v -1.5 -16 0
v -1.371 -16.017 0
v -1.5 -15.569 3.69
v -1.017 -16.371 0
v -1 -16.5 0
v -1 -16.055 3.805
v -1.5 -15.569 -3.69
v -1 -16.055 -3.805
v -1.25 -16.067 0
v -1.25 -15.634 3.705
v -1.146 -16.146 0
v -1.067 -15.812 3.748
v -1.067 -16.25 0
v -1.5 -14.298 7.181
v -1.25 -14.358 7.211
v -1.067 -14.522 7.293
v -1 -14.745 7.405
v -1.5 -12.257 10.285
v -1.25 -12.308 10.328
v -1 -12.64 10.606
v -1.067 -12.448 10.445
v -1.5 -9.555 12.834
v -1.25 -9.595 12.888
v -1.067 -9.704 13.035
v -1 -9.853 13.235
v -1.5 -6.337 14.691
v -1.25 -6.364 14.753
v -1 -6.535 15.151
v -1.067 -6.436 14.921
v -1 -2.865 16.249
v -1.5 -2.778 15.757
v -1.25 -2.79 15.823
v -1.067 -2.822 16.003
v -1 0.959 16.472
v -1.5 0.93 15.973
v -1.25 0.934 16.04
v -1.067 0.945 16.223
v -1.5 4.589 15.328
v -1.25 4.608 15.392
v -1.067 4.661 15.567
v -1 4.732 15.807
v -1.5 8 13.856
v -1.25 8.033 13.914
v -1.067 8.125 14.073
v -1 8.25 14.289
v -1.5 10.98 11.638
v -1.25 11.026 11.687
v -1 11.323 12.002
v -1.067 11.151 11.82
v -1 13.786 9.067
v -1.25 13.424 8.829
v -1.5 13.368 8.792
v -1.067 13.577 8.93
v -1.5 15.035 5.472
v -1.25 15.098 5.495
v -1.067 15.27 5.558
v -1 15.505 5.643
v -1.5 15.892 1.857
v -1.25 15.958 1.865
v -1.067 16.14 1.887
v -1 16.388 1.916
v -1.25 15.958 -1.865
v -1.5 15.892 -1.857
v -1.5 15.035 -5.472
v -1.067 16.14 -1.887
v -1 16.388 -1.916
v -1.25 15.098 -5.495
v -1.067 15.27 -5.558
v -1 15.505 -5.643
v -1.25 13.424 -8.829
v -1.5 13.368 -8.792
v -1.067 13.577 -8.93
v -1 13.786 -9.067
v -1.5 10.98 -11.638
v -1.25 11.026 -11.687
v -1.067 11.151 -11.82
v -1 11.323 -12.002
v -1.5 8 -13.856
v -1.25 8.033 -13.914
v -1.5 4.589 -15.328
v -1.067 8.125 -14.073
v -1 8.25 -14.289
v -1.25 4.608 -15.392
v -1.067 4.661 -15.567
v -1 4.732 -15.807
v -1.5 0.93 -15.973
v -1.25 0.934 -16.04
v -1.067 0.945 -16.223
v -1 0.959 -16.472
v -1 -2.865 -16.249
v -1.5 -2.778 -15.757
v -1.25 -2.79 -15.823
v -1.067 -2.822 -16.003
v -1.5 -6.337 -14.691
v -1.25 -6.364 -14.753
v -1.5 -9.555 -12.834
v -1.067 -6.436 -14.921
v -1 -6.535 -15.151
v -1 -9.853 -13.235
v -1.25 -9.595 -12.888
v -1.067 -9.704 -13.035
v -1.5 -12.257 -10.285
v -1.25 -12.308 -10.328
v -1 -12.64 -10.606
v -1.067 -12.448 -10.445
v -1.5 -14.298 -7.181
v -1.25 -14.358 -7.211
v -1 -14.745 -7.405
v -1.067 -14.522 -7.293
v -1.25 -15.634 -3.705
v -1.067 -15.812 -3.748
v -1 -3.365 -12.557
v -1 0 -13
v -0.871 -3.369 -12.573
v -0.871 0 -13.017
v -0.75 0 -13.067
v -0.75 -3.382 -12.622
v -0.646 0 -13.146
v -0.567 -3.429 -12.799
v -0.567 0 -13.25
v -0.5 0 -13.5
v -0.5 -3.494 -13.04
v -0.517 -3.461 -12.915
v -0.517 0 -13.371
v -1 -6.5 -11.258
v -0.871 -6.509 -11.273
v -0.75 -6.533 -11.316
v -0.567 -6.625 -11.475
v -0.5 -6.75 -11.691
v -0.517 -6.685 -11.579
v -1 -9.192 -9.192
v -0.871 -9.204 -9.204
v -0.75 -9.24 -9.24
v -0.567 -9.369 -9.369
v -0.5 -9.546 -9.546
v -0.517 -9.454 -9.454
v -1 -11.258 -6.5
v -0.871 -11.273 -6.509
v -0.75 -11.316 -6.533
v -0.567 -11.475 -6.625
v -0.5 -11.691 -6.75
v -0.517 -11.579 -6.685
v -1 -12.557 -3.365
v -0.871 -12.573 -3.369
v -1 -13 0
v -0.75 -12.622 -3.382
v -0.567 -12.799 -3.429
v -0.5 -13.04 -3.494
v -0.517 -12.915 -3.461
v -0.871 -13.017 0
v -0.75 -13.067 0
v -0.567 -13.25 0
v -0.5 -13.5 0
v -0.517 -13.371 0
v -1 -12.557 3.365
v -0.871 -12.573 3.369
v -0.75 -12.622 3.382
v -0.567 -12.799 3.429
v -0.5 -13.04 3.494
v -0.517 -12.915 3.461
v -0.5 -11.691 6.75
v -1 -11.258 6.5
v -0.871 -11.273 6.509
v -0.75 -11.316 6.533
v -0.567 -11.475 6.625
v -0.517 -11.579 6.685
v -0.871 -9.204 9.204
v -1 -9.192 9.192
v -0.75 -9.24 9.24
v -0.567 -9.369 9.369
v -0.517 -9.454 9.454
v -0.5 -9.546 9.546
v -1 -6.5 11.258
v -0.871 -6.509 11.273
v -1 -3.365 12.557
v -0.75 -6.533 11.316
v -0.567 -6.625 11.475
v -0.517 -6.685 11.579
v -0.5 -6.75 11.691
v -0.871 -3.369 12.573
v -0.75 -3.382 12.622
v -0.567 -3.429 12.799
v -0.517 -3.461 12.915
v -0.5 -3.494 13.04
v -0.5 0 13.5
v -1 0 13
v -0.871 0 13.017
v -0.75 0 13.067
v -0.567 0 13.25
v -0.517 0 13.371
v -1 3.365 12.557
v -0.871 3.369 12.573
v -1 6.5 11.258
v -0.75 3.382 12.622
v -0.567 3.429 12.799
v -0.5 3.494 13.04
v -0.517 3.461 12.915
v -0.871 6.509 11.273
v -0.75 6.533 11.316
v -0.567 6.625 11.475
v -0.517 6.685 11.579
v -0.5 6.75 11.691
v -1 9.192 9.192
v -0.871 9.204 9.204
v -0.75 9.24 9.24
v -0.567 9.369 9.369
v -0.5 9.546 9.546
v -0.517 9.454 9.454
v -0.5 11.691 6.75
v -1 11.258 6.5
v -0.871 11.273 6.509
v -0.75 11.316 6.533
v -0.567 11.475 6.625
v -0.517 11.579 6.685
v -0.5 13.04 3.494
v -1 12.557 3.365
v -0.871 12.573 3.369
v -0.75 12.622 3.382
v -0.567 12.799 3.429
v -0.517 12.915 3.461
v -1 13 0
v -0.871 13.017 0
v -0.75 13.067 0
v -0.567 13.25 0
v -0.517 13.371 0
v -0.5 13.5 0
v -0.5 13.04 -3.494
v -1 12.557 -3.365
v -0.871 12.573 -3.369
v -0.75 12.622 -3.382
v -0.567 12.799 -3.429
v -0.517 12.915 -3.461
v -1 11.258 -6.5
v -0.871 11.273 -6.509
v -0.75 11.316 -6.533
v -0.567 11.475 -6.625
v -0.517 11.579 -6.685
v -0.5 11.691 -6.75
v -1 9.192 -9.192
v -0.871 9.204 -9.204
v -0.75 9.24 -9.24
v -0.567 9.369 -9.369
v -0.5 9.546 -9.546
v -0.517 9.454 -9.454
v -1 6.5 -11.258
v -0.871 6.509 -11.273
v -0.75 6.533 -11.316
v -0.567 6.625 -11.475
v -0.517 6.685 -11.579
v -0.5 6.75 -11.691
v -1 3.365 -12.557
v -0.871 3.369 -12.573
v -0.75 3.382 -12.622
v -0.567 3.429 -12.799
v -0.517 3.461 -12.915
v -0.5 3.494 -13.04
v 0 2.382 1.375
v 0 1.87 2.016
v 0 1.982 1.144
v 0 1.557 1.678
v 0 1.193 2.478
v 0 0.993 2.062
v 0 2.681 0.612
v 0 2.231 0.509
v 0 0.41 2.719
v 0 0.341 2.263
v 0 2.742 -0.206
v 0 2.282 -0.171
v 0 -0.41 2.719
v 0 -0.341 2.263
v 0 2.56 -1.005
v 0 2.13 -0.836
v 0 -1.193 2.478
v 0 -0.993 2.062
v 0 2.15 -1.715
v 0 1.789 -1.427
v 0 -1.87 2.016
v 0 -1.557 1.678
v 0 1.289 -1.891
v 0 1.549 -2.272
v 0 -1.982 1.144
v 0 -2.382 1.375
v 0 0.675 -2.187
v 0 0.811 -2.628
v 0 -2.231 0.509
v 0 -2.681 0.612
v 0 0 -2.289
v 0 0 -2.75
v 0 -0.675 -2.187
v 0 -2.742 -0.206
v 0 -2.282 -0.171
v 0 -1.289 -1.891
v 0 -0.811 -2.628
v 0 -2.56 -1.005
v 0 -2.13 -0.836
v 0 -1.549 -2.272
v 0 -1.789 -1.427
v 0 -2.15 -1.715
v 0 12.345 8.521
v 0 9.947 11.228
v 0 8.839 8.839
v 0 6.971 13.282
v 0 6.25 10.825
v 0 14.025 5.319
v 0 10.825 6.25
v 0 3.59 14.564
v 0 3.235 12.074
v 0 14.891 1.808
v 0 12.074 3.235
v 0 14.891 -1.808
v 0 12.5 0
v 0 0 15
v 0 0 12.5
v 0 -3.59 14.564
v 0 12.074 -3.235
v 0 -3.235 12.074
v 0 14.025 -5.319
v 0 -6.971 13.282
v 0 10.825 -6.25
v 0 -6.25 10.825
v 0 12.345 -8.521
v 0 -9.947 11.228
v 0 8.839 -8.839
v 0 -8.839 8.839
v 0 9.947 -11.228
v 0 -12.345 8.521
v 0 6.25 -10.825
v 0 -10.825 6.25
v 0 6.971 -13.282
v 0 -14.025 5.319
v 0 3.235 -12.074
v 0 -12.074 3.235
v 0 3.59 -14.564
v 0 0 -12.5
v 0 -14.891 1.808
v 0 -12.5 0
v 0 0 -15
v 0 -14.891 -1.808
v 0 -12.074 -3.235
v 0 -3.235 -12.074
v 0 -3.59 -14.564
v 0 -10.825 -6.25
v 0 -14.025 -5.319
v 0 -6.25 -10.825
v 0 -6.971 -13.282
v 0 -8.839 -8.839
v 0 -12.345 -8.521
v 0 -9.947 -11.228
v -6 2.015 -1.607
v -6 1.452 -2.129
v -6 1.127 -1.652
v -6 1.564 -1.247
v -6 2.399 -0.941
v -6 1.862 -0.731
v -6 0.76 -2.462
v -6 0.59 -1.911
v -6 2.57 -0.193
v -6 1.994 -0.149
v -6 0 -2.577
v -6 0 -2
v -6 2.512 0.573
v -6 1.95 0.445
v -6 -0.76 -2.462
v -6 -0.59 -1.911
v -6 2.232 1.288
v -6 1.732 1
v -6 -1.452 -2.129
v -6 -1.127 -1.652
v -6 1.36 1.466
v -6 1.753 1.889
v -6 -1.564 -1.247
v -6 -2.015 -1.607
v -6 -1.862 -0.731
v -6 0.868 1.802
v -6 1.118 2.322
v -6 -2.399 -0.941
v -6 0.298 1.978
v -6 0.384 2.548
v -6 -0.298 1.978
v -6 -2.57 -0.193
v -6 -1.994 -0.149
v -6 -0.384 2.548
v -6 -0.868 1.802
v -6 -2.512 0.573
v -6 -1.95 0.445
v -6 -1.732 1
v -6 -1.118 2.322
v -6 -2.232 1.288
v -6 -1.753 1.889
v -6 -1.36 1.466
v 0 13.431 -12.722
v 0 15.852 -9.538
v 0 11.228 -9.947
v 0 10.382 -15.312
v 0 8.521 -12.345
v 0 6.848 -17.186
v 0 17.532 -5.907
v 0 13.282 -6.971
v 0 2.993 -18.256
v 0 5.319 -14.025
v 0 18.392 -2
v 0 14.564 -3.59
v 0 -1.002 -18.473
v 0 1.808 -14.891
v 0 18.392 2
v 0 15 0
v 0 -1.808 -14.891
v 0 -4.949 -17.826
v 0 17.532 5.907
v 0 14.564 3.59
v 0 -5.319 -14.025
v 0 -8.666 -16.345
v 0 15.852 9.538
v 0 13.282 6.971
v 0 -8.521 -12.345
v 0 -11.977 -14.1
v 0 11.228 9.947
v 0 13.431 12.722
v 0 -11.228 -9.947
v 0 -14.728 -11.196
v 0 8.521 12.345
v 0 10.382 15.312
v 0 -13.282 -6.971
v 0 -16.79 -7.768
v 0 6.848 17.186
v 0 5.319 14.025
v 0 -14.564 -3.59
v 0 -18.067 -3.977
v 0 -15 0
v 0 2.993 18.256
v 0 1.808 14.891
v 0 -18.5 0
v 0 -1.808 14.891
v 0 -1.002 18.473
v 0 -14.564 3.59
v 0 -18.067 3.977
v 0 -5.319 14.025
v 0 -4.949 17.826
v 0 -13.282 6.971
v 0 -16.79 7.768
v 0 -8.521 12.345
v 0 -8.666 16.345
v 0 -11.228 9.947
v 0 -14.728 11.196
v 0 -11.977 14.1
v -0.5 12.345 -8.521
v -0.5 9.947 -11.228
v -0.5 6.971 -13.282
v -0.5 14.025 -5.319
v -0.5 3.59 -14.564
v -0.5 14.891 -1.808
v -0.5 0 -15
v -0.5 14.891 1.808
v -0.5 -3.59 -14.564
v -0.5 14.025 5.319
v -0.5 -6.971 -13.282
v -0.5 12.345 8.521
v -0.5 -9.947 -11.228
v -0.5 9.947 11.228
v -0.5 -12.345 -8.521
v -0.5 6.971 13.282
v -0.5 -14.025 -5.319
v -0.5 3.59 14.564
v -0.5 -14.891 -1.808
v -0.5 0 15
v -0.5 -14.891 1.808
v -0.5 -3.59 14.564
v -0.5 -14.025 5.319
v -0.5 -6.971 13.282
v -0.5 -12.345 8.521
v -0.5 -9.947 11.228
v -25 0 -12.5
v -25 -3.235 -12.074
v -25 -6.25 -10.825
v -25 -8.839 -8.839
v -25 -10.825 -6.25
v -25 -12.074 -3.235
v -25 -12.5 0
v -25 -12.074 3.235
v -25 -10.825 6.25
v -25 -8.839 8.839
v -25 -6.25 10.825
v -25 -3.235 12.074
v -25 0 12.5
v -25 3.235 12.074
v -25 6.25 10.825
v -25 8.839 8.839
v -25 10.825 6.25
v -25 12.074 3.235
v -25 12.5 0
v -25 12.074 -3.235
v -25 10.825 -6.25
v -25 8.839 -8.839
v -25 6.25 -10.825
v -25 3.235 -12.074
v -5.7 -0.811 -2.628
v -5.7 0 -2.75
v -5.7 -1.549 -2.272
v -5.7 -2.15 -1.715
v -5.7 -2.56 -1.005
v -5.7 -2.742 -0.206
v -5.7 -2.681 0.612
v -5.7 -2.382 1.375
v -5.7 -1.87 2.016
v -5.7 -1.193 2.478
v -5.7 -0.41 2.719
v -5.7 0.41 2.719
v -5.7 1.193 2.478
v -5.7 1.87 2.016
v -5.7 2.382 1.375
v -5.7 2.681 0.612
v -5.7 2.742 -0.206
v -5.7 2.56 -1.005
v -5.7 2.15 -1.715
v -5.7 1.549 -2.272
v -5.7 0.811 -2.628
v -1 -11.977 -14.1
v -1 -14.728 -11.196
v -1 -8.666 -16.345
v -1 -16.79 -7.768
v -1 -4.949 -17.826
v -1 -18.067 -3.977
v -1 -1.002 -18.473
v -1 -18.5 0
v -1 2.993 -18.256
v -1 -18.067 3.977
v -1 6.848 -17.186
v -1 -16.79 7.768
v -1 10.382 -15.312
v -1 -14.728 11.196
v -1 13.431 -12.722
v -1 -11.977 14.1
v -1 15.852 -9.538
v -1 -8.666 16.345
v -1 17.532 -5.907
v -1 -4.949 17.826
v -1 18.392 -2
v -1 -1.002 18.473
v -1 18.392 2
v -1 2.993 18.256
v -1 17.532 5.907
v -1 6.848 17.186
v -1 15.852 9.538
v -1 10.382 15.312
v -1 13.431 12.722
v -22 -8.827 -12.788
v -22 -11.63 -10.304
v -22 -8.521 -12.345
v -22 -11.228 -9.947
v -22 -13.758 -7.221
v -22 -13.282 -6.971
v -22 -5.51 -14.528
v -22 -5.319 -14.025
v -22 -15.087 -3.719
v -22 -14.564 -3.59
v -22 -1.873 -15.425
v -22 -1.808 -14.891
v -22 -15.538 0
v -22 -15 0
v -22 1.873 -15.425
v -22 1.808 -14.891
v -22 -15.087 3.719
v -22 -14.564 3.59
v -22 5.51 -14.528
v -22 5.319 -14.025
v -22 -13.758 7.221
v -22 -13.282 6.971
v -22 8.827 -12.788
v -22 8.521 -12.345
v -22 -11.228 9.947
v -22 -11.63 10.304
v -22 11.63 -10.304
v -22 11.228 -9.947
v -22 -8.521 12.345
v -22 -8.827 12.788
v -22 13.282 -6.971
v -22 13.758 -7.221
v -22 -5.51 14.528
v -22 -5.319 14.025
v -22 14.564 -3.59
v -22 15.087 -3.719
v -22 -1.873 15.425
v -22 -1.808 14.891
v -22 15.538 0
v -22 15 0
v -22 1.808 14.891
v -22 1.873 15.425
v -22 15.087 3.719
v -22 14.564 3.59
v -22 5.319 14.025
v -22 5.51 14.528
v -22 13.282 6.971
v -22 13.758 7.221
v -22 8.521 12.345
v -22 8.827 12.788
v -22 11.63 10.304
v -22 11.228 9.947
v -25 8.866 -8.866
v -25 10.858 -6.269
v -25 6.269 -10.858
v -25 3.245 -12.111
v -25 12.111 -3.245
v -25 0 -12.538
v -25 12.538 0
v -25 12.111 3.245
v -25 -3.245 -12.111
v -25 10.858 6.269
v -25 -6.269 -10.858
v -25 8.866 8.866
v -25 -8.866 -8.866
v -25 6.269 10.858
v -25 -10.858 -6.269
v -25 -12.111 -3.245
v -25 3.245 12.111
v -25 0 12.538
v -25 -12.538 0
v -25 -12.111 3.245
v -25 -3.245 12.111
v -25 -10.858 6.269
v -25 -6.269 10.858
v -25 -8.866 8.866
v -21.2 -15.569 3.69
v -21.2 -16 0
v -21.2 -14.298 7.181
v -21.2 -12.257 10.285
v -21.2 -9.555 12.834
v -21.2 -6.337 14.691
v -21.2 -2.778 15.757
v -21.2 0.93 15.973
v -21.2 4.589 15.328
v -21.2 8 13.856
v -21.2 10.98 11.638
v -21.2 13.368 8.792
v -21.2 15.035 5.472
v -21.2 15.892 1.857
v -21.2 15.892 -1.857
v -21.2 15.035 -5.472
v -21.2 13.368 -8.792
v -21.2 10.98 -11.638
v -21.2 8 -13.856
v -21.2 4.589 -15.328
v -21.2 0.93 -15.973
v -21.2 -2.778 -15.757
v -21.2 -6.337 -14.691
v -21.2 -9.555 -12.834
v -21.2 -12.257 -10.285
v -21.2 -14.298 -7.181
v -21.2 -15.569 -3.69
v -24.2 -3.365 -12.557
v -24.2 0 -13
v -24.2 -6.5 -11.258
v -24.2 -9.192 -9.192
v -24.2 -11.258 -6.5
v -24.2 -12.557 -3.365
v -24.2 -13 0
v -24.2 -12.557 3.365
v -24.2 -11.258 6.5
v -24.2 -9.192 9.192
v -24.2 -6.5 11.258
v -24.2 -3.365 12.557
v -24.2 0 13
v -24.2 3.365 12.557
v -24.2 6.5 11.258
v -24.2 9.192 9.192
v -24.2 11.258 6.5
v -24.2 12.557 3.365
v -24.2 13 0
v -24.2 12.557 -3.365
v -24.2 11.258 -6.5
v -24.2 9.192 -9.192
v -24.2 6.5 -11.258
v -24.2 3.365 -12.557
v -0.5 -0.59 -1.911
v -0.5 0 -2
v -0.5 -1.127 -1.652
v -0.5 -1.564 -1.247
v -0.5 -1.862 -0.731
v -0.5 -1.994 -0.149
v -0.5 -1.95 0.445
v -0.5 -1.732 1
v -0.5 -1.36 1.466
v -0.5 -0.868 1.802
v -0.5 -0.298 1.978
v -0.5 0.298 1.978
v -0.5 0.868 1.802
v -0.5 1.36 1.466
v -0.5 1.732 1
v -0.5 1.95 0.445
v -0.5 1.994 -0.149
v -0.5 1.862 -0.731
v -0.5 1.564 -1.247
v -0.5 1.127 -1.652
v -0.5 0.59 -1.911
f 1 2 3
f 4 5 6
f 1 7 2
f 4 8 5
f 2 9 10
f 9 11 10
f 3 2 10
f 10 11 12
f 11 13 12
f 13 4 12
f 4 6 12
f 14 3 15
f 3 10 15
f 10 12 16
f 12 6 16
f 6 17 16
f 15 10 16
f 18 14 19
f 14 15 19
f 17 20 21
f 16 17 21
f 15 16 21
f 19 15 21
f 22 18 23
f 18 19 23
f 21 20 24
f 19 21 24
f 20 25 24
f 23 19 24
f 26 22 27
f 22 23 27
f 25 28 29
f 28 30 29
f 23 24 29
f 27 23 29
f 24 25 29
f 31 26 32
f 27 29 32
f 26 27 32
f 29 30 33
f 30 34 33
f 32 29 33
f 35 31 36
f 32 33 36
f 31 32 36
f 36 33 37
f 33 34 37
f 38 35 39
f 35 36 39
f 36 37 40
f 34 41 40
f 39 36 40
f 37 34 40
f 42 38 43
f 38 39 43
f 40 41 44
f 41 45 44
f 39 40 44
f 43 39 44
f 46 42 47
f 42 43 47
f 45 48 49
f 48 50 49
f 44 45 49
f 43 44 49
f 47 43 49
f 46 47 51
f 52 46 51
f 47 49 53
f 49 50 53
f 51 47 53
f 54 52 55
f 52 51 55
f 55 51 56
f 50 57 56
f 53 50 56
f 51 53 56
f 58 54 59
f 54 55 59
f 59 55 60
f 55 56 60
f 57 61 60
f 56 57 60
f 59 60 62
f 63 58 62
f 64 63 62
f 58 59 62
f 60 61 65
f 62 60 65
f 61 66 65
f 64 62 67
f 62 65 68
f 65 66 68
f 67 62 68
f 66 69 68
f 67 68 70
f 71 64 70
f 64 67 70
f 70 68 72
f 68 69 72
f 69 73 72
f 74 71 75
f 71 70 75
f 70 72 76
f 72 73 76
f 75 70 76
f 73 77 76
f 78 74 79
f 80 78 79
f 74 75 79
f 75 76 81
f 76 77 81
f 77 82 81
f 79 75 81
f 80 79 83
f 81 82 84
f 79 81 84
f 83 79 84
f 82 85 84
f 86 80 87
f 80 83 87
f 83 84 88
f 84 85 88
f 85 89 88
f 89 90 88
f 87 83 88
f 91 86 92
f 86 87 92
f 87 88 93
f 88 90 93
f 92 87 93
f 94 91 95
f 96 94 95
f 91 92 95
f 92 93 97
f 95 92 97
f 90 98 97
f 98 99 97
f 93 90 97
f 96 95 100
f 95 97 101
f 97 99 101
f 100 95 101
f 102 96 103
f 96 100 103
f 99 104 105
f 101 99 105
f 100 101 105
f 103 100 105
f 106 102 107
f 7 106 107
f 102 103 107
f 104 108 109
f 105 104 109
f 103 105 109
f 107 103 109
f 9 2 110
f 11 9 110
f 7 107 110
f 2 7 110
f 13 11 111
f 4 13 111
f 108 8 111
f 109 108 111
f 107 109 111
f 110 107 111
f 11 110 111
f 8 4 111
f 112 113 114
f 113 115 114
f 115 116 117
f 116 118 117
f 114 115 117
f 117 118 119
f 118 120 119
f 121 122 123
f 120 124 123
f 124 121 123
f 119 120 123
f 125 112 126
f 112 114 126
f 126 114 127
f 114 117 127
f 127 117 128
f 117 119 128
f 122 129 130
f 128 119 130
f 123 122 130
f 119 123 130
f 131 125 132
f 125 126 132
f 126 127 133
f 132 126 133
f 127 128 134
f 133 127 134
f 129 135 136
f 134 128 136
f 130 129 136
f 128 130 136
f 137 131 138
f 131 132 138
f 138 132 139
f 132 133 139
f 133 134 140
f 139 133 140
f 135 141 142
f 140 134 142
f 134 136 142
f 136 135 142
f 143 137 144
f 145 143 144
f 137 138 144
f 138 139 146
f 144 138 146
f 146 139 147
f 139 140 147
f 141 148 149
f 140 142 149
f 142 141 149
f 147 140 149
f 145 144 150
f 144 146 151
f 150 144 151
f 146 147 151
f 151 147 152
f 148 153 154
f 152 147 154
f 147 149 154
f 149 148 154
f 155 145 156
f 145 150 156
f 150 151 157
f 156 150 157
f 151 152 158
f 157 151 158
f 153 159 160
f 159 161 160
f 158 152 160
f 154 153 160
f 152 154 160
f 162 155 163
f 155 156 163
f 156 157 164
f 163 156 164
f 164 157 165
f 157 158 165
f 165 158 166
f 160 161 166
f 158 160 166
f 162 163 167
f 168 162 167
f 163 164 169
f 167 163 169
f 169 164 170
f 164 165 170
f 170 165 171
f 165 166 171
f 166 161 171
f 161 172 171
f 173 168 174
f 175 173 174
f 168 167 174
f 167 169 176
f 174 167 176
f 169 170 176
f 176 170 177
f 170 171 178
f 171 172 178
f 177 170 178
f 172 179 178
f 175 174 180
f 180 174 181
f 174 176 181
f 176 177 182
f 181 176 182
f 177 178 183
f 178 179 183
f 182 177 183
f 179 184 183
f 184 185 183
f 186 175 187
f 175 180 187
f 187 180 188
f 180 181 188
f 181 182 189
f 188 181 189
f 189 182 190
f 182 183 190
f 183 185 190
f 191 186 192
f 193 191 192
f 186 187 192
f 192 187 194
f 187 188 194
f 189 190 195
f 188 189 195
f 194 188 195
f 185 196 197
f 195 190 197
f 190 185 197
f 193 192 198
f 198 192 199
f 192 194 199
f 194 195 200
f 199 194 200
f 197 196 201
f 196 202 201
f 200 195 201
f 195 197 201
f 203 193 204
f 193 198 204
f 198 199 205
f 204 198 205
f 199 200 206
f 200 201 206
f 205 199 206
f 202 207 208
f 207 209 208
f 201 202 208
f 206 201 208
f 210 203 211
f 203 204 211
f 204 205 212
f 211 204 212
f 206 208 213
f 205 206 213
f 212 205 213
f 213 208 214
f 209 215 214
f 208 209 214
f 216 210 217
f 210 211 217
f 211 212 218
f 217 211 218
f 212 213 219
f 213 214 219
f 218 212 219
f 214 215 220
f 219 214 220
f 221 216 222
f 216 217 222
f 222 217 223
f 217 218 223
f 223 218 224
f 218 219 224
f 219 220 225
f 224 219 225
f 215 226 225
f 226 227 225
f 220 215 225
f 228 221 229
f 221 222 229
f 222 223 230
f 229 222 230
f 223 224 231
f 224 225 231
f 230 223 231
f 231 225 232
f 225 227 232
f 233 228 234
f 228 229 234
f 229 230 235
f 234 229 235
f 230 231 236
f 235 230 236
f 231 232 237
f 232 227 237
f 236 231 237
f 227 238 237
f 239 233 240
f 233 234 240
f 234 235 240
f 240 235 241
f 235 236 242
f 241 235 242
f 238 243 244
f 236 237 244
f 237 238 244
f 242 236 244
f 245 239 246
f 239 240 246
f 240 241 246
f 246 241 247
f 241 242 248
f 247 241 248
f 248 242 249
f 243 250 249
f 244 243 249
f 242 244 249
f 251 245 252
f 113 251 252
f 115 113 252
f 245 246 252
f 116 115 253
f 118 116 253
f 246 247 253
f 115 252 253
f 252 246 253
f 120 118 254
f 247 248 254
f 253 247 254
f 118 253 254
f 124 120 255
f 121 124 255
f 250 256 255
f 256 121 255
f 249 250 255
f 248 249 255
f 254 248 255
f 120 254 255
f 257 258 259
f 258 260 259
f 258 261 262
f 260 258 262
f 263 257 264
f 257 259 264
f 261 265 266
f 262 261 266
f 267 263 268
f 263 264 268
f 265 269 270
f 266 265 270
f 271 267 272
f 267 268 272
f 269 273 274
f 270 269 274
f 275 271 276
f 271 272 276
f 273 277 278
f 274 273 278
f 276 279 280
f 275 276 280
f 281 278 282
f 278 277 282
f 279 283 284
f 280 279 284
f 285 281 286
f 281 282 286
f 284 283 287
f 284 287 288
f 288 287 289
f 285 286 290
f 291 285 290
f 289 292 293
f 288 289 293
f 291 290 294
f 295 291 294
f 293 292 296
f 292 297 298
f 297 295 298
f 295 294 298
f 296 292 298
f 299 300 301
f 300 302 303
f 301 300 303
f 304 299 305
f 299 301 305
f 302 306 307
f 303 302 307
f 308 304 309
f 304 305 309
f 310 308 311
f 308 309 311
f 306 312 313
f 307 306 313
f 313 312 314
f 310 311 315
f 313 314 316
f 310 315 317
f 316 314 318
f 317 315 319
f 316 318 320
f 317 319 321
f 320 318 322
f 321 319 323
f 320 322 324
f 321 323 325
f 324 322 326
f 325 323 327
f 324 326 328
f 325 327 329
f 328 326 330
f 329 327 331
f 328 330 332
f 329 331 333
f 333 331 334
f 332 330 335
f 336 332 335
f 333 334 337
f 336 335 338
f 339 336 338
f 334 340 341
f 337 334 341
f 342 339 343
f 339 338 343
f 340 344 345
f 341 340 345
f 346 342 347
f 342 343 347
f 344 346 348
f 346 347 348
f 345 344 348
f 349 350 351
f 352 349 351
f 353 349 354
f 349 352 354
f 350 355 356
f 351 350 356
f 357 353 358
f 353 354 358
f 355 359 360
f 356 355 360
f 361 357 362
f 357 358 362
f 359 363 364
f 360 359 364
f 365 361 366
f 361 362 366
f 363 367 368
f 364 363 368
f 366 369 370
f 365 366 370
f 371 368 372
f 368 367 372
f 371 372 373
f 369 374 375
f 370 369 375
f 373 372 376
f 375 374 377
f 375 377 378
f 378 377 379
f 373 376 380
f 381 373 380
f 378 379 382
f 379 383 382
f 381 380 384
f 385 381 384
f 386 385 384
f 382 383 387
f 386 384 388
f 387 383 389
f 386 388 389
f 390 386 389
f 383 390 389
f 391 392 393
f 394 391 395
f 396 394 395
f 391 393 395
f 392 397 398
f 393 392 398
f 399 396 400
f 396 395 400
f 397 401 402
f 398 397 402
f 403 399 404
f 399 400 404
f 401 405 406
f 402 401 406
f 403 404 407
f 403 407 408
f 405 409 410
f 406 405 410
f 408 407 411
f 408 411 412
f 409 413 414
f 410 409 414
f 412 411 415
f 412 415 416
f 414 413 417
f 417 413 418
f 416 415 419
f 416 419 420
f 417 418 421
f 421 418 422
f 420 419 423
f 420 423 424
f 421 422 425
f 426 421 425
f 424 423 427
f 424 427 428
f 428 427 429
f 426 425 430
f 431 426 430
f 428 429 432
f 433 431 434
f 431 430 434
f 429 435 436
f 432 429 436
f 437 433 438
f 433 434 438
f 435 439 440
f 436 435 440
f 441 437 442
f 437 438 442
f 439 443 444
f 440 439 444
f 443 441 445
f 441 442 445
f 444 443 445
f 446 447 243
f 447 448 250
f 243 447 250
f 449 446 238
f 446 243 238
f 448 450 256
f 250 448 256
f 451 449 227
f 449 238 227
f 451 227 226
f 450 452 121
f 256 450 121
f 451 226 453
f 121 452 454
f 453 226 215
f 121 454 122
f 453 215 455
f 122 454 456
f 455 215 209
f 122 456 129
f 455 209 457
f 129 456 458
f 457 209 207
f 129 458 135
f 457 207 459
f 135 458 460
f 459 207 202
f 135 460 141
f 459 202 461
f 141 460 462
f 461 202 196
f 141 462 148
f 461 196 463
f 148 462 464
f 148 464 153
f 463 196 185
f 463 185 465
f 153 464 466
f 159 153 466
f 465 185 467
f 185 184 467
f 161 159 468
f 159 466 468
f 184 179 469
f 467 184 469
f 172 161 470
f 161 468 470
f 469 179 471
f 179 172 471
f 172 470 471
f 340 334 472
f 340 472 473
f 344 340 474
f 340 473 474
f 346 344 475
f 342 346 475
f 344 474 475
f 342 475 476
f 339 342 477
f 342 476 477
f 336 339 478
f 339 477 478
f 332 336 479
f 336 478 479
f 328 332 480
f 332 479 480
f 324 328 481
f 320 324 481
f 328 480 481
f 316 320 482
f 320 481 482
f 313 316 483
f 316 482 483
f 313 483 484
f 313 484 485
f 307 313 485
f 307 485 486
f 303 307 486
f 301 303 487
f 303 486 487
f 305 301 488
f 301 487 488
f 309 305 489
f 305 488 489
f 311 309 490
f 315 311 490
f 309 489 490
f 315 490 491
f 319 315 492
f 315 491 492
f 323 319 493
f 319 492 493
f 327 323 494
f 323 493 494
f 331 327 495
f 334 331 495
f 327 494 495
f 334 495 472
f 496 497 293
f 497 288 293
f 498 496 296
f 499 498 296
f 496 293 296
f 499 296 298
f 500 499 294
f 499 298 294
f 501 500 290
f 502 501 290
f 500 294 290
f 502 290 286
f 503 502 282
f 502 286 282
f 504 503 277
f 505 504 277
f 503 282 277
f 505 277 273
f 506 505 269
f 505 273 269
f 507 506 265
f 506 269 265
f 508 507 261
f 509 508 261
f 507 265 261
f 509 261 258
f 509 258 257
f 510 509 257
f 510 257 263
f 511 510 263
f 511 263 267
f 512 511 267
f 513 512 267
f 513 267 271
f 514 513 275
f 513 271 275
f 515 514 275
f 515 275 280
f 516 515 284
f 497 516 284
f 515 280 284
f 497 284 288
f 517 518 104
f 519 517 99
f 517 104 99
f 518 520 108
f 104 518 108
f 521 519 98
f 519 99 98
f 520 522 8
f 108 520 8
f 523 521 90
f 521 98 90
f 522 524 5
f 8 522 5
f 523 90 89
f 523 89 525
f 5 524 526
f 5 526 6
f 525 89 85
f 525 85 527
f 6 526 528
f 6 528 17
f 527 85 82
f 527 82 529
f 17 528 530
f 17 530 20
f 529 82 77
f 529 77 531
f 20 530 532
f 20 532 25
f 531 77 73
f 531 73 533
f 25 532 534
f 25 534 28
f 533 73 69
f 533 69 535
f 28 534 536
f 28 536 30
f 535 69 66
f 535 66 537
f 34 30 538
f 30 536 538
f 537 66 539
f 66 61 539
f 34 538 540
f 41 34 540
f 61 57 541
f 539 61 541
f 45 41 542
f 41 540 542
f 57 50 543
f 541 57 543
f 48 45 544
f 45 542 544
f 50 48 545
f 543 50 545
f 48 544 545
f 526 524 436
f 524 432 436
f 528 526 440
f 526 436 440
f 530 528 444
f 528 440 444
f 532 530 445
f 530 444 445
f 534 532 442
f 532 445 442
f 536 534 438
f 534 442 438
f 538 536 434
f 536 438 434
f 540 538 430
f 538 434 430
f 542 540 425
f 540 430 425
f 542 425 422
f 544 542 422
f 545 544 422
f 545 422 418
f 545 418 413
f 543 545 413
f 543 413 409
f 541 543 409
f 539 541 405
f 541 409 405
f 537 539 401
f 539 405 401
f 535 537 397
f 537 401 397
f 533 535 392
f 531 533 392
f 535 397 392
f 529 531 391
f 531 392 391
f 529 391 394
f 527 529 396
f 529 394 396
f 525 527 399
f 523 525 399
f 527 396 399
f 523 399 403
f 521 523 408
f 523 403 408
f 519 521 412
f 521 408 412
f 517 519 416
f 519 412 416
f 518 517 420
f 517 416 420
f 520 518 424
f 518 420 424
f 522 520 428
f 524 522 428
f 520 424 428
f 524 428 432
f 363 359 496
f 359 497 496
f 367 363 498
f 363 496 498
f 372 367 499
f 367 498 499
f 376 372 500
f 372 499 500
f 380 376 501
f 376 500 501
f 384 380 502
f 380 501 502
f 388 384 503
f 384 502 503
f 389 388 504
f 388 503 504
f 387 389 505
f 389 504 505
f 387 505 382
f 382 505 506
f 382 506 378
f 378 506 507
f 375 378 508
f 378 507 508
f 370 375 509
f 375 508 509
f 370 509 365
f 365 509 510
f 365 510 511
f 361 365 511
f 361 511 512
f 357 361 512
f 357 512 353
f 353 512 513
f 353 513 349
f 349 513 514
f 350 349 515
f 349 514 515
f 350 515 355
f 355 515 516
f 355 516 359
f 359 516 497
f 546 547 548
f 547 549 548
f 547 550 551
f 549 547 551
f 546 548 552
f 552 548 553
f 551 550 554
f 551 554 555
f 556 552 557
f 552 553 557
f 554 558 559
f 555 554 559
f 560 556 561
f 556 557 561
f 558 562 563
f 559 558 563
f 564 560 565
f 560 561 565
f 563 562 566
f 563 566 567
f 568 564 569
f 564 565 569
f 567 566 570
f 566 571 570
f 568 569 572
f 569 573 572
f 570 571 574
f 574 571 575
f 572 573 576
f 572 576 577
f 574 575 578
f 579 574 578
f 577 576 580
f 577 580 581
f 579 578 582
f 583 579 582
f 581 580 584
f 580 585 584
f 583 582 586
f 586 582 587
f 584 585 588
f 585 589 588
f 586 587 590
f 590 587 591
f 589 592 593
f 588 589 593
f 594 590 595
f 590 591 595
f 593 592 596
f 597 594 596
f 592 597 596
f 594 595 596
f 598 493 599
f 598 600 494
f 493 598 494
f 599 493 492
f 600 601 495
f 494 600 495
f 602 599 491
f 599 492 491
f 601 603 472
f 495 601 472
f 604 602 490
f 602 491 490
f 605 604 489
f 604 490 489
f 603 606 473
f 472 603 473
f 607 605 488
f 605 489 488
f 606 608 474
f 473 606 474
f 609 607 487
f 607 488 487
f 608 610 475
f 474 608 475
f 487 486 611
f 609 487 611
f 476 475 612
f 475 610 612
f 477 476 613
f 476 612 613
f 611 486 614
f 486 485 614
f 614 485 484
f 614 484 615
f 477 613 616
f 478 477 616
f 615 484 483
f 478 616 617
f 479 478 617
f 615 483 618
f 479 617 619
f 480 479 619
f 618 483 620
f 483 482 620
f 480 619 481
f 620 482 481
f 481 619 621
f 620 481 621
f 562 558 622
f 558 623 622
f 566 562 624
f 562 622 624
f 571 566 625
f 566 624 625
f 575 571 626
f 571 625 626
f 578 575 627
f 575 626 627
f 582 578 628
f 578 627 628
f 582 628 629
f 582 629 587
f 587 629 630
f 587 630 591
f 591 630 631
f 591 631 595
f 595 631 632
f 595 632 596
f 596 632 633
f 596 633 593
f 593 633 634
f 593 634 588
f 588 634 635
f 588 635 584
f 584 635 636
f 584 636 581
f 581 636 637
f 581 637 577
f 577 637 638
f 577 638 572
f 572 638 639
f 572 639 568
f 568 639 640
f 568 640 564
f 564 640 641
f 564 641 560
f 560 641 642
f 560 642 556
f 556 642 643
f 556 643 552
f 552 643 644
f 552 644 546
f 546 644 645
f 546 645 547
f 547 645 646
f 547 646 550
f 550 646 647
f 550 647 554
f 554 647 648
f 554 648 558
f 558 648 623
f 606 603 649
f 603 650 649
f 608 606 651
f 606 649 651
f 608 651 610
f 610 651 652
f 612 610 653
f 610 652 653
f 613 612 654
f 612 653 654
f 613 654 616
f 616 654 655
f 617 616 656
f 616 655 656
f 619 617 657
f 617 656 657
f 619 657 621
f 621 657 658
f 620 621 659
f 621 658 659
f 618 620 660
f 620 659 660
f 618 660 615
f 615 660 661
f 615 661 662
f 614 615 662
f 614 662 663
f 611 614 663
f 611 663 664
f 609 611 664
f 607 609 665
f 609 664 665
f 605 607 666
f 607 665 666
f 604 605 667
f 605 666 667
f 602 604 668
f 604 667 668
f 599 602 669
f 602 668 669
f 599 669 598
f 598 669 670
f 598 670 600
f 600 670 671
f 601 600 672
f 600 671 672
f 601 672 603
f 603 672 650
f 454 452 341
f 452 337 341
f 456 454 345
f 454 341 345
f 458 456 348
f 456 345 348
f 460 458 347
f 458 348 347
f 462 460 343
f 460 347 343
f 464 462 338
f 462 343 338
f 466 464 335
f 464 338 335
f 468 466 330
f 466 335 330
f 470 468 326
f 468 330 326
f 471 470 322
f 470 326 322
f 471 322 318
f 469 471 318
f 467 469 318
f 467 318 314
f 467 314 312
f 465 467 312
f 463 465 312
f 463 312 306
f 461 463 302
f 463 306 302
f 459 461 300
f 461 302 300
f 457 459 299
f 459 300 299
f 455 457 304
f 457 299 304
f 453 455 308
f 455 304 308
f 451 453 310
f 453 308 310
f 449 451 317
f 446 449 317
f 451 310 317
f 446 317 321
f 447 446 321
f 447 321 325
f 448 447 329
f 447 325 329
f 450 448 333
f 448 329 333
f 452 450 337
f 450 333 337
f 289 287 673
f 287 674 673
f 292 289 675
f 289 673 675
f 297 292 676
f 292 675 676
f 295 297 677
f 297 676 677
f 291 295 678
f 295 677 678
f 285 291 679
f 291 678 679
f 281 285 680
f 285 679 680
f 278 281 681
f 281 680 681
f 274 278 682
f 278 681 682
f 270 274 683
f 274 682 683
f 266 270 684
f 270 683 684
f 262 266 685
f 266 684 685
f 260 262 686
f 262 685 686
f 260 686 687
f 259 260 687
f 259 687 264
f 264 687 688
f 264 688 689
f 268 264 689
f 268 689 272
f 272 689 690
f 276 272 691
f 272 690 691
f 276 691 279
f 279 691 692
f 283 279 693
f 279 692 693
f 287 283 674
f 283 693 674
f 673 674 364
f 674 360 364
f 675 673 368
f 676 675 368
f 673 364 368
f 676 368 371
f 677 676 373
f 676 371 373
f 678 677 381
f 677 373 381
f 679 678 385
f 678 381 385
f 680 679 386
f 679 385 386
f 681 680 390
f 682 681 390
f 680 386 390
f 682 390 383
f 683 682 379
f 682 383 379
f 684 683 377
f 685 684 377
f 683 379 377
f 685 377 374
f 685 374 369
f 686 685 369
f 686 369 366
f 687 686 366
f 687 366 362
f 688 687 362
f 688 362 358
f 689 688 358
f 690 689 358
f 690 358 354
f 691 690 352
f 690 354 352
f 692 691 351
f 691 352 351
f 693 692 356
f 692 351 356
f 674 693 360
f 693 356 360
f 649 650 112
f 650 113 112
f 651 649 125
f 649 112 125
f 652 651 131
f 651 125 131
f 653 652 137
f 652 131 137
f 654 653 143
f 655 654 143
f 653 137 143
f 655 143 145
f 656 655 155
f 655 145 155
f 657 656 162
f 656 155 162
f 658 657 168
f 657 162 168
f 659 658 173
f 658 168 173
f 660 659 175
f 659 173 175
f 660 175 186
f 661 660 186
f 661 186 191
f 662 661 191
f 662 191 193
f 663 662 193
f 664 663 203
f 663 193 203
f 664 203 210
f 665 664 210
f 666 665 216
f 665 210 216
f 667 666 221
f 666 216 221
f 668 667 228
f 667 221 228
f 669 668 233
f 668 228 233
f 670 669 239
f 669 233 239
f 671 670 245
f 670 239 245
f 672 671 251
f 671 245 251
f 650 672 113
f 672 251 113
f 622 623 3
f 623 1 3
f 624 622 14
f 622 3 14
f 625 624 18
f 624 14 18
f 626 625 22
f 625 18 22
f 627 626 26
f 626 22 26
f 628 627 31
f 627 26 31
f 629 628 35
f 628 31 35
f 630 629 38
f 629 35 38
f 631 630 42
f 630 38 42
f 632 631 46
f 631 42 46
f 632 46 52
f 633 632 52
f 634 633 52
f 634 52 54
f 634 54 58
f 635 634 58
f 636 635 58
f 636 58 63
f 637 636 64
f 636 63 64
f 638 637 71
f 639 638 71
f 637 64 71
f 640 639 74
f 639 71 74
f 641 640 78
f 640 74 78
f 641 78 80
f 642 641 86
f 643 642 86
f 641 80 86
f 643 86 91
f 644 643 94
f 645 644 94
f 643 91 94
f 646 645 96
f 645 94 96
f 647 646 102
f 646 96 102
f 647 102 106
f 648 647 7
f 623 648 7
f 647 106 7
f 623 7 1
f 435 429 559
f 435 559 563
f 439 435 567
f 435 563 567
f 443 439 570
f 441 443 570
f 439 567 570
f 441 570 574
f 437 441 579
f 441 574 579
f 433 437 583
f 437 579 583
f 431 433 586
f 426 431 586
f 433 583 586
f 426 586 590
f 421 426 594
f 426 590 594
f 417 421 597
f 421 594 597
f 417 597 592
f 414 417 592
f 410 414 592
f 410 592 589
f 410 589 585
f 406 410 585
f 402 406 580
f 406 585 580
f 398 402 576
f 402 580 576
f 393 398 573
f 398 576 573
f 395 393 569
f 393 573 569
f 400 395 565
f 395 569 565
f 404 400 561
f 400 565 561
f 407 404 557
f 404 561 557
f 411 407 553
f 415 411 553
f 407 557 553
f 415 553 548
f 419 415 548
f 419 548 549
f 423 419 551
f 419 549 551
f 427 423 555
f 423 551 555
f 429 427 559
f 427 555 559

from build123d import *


with BuildPart() as f1:
    # F0 (on Front) → F1 (revolve)
    with BuildSketch(Plane.XZ):
        with BuildLine():
            Line((0, -15), (0, -12.5))
            Line((0, -12.5), (-25, -12.5))
            Line((-25, -12.5), (-25, -12.53812))
            Line((-25, -12.53812), (-24.2, -13))
            Line((-24.2, -13), (-1, -13))
            ThreePointArc((-1, -13), (-0.646447, -13.146447), (-0.5, -13.5))
            Line((-0.5, -13.5), (-0.5, -15))
            Line((-0.5, -15), (0, -15))
        make_face()
    revolve(axis=Axis((-12.5, 0, 0), (-1, 0, 0)))


with BuildPart() as f3:
    # F2 (on Front) → F3 (revolve)
    with BuildSketch(Plane.XZ):
        Polygon((0, -2.75), (0, -2.288675), (-0.5, -2), (-6, -2), (-6, -2.576795), (-5.7, -2.75), align=None)
    revolve(axis=Axis((-3, 0, 0), (-1, 0, 0)))


with BuildPart() as f5:
    # F4 (on Top) → F5 (revolve)
    with BuildSketch(Plane.XY):
        with BuildLine():
            Line((0, -18.5), (0, -15))
            Line((0, -15), (-22, -15))
            Line((-22, -15), (-22, -15.53812))
            Line((-22, -15.53812), (-21.2, -16))
            Line((-21.2, -16), (-1.5, -16))
            ThreePointArc((-1.5, -16), (-1.146447, -16.146447), (-1, -16.5))
            Line((-1, -16.5), (-1, -18.5))
            Line((-1, -18.5), (0, -18.5))
        make_face()
    revolve(axis=Axis((-11, 0, 0), (-1, 0, 0)))


solid = Compound([f1.part, f3.part, f5.part])
